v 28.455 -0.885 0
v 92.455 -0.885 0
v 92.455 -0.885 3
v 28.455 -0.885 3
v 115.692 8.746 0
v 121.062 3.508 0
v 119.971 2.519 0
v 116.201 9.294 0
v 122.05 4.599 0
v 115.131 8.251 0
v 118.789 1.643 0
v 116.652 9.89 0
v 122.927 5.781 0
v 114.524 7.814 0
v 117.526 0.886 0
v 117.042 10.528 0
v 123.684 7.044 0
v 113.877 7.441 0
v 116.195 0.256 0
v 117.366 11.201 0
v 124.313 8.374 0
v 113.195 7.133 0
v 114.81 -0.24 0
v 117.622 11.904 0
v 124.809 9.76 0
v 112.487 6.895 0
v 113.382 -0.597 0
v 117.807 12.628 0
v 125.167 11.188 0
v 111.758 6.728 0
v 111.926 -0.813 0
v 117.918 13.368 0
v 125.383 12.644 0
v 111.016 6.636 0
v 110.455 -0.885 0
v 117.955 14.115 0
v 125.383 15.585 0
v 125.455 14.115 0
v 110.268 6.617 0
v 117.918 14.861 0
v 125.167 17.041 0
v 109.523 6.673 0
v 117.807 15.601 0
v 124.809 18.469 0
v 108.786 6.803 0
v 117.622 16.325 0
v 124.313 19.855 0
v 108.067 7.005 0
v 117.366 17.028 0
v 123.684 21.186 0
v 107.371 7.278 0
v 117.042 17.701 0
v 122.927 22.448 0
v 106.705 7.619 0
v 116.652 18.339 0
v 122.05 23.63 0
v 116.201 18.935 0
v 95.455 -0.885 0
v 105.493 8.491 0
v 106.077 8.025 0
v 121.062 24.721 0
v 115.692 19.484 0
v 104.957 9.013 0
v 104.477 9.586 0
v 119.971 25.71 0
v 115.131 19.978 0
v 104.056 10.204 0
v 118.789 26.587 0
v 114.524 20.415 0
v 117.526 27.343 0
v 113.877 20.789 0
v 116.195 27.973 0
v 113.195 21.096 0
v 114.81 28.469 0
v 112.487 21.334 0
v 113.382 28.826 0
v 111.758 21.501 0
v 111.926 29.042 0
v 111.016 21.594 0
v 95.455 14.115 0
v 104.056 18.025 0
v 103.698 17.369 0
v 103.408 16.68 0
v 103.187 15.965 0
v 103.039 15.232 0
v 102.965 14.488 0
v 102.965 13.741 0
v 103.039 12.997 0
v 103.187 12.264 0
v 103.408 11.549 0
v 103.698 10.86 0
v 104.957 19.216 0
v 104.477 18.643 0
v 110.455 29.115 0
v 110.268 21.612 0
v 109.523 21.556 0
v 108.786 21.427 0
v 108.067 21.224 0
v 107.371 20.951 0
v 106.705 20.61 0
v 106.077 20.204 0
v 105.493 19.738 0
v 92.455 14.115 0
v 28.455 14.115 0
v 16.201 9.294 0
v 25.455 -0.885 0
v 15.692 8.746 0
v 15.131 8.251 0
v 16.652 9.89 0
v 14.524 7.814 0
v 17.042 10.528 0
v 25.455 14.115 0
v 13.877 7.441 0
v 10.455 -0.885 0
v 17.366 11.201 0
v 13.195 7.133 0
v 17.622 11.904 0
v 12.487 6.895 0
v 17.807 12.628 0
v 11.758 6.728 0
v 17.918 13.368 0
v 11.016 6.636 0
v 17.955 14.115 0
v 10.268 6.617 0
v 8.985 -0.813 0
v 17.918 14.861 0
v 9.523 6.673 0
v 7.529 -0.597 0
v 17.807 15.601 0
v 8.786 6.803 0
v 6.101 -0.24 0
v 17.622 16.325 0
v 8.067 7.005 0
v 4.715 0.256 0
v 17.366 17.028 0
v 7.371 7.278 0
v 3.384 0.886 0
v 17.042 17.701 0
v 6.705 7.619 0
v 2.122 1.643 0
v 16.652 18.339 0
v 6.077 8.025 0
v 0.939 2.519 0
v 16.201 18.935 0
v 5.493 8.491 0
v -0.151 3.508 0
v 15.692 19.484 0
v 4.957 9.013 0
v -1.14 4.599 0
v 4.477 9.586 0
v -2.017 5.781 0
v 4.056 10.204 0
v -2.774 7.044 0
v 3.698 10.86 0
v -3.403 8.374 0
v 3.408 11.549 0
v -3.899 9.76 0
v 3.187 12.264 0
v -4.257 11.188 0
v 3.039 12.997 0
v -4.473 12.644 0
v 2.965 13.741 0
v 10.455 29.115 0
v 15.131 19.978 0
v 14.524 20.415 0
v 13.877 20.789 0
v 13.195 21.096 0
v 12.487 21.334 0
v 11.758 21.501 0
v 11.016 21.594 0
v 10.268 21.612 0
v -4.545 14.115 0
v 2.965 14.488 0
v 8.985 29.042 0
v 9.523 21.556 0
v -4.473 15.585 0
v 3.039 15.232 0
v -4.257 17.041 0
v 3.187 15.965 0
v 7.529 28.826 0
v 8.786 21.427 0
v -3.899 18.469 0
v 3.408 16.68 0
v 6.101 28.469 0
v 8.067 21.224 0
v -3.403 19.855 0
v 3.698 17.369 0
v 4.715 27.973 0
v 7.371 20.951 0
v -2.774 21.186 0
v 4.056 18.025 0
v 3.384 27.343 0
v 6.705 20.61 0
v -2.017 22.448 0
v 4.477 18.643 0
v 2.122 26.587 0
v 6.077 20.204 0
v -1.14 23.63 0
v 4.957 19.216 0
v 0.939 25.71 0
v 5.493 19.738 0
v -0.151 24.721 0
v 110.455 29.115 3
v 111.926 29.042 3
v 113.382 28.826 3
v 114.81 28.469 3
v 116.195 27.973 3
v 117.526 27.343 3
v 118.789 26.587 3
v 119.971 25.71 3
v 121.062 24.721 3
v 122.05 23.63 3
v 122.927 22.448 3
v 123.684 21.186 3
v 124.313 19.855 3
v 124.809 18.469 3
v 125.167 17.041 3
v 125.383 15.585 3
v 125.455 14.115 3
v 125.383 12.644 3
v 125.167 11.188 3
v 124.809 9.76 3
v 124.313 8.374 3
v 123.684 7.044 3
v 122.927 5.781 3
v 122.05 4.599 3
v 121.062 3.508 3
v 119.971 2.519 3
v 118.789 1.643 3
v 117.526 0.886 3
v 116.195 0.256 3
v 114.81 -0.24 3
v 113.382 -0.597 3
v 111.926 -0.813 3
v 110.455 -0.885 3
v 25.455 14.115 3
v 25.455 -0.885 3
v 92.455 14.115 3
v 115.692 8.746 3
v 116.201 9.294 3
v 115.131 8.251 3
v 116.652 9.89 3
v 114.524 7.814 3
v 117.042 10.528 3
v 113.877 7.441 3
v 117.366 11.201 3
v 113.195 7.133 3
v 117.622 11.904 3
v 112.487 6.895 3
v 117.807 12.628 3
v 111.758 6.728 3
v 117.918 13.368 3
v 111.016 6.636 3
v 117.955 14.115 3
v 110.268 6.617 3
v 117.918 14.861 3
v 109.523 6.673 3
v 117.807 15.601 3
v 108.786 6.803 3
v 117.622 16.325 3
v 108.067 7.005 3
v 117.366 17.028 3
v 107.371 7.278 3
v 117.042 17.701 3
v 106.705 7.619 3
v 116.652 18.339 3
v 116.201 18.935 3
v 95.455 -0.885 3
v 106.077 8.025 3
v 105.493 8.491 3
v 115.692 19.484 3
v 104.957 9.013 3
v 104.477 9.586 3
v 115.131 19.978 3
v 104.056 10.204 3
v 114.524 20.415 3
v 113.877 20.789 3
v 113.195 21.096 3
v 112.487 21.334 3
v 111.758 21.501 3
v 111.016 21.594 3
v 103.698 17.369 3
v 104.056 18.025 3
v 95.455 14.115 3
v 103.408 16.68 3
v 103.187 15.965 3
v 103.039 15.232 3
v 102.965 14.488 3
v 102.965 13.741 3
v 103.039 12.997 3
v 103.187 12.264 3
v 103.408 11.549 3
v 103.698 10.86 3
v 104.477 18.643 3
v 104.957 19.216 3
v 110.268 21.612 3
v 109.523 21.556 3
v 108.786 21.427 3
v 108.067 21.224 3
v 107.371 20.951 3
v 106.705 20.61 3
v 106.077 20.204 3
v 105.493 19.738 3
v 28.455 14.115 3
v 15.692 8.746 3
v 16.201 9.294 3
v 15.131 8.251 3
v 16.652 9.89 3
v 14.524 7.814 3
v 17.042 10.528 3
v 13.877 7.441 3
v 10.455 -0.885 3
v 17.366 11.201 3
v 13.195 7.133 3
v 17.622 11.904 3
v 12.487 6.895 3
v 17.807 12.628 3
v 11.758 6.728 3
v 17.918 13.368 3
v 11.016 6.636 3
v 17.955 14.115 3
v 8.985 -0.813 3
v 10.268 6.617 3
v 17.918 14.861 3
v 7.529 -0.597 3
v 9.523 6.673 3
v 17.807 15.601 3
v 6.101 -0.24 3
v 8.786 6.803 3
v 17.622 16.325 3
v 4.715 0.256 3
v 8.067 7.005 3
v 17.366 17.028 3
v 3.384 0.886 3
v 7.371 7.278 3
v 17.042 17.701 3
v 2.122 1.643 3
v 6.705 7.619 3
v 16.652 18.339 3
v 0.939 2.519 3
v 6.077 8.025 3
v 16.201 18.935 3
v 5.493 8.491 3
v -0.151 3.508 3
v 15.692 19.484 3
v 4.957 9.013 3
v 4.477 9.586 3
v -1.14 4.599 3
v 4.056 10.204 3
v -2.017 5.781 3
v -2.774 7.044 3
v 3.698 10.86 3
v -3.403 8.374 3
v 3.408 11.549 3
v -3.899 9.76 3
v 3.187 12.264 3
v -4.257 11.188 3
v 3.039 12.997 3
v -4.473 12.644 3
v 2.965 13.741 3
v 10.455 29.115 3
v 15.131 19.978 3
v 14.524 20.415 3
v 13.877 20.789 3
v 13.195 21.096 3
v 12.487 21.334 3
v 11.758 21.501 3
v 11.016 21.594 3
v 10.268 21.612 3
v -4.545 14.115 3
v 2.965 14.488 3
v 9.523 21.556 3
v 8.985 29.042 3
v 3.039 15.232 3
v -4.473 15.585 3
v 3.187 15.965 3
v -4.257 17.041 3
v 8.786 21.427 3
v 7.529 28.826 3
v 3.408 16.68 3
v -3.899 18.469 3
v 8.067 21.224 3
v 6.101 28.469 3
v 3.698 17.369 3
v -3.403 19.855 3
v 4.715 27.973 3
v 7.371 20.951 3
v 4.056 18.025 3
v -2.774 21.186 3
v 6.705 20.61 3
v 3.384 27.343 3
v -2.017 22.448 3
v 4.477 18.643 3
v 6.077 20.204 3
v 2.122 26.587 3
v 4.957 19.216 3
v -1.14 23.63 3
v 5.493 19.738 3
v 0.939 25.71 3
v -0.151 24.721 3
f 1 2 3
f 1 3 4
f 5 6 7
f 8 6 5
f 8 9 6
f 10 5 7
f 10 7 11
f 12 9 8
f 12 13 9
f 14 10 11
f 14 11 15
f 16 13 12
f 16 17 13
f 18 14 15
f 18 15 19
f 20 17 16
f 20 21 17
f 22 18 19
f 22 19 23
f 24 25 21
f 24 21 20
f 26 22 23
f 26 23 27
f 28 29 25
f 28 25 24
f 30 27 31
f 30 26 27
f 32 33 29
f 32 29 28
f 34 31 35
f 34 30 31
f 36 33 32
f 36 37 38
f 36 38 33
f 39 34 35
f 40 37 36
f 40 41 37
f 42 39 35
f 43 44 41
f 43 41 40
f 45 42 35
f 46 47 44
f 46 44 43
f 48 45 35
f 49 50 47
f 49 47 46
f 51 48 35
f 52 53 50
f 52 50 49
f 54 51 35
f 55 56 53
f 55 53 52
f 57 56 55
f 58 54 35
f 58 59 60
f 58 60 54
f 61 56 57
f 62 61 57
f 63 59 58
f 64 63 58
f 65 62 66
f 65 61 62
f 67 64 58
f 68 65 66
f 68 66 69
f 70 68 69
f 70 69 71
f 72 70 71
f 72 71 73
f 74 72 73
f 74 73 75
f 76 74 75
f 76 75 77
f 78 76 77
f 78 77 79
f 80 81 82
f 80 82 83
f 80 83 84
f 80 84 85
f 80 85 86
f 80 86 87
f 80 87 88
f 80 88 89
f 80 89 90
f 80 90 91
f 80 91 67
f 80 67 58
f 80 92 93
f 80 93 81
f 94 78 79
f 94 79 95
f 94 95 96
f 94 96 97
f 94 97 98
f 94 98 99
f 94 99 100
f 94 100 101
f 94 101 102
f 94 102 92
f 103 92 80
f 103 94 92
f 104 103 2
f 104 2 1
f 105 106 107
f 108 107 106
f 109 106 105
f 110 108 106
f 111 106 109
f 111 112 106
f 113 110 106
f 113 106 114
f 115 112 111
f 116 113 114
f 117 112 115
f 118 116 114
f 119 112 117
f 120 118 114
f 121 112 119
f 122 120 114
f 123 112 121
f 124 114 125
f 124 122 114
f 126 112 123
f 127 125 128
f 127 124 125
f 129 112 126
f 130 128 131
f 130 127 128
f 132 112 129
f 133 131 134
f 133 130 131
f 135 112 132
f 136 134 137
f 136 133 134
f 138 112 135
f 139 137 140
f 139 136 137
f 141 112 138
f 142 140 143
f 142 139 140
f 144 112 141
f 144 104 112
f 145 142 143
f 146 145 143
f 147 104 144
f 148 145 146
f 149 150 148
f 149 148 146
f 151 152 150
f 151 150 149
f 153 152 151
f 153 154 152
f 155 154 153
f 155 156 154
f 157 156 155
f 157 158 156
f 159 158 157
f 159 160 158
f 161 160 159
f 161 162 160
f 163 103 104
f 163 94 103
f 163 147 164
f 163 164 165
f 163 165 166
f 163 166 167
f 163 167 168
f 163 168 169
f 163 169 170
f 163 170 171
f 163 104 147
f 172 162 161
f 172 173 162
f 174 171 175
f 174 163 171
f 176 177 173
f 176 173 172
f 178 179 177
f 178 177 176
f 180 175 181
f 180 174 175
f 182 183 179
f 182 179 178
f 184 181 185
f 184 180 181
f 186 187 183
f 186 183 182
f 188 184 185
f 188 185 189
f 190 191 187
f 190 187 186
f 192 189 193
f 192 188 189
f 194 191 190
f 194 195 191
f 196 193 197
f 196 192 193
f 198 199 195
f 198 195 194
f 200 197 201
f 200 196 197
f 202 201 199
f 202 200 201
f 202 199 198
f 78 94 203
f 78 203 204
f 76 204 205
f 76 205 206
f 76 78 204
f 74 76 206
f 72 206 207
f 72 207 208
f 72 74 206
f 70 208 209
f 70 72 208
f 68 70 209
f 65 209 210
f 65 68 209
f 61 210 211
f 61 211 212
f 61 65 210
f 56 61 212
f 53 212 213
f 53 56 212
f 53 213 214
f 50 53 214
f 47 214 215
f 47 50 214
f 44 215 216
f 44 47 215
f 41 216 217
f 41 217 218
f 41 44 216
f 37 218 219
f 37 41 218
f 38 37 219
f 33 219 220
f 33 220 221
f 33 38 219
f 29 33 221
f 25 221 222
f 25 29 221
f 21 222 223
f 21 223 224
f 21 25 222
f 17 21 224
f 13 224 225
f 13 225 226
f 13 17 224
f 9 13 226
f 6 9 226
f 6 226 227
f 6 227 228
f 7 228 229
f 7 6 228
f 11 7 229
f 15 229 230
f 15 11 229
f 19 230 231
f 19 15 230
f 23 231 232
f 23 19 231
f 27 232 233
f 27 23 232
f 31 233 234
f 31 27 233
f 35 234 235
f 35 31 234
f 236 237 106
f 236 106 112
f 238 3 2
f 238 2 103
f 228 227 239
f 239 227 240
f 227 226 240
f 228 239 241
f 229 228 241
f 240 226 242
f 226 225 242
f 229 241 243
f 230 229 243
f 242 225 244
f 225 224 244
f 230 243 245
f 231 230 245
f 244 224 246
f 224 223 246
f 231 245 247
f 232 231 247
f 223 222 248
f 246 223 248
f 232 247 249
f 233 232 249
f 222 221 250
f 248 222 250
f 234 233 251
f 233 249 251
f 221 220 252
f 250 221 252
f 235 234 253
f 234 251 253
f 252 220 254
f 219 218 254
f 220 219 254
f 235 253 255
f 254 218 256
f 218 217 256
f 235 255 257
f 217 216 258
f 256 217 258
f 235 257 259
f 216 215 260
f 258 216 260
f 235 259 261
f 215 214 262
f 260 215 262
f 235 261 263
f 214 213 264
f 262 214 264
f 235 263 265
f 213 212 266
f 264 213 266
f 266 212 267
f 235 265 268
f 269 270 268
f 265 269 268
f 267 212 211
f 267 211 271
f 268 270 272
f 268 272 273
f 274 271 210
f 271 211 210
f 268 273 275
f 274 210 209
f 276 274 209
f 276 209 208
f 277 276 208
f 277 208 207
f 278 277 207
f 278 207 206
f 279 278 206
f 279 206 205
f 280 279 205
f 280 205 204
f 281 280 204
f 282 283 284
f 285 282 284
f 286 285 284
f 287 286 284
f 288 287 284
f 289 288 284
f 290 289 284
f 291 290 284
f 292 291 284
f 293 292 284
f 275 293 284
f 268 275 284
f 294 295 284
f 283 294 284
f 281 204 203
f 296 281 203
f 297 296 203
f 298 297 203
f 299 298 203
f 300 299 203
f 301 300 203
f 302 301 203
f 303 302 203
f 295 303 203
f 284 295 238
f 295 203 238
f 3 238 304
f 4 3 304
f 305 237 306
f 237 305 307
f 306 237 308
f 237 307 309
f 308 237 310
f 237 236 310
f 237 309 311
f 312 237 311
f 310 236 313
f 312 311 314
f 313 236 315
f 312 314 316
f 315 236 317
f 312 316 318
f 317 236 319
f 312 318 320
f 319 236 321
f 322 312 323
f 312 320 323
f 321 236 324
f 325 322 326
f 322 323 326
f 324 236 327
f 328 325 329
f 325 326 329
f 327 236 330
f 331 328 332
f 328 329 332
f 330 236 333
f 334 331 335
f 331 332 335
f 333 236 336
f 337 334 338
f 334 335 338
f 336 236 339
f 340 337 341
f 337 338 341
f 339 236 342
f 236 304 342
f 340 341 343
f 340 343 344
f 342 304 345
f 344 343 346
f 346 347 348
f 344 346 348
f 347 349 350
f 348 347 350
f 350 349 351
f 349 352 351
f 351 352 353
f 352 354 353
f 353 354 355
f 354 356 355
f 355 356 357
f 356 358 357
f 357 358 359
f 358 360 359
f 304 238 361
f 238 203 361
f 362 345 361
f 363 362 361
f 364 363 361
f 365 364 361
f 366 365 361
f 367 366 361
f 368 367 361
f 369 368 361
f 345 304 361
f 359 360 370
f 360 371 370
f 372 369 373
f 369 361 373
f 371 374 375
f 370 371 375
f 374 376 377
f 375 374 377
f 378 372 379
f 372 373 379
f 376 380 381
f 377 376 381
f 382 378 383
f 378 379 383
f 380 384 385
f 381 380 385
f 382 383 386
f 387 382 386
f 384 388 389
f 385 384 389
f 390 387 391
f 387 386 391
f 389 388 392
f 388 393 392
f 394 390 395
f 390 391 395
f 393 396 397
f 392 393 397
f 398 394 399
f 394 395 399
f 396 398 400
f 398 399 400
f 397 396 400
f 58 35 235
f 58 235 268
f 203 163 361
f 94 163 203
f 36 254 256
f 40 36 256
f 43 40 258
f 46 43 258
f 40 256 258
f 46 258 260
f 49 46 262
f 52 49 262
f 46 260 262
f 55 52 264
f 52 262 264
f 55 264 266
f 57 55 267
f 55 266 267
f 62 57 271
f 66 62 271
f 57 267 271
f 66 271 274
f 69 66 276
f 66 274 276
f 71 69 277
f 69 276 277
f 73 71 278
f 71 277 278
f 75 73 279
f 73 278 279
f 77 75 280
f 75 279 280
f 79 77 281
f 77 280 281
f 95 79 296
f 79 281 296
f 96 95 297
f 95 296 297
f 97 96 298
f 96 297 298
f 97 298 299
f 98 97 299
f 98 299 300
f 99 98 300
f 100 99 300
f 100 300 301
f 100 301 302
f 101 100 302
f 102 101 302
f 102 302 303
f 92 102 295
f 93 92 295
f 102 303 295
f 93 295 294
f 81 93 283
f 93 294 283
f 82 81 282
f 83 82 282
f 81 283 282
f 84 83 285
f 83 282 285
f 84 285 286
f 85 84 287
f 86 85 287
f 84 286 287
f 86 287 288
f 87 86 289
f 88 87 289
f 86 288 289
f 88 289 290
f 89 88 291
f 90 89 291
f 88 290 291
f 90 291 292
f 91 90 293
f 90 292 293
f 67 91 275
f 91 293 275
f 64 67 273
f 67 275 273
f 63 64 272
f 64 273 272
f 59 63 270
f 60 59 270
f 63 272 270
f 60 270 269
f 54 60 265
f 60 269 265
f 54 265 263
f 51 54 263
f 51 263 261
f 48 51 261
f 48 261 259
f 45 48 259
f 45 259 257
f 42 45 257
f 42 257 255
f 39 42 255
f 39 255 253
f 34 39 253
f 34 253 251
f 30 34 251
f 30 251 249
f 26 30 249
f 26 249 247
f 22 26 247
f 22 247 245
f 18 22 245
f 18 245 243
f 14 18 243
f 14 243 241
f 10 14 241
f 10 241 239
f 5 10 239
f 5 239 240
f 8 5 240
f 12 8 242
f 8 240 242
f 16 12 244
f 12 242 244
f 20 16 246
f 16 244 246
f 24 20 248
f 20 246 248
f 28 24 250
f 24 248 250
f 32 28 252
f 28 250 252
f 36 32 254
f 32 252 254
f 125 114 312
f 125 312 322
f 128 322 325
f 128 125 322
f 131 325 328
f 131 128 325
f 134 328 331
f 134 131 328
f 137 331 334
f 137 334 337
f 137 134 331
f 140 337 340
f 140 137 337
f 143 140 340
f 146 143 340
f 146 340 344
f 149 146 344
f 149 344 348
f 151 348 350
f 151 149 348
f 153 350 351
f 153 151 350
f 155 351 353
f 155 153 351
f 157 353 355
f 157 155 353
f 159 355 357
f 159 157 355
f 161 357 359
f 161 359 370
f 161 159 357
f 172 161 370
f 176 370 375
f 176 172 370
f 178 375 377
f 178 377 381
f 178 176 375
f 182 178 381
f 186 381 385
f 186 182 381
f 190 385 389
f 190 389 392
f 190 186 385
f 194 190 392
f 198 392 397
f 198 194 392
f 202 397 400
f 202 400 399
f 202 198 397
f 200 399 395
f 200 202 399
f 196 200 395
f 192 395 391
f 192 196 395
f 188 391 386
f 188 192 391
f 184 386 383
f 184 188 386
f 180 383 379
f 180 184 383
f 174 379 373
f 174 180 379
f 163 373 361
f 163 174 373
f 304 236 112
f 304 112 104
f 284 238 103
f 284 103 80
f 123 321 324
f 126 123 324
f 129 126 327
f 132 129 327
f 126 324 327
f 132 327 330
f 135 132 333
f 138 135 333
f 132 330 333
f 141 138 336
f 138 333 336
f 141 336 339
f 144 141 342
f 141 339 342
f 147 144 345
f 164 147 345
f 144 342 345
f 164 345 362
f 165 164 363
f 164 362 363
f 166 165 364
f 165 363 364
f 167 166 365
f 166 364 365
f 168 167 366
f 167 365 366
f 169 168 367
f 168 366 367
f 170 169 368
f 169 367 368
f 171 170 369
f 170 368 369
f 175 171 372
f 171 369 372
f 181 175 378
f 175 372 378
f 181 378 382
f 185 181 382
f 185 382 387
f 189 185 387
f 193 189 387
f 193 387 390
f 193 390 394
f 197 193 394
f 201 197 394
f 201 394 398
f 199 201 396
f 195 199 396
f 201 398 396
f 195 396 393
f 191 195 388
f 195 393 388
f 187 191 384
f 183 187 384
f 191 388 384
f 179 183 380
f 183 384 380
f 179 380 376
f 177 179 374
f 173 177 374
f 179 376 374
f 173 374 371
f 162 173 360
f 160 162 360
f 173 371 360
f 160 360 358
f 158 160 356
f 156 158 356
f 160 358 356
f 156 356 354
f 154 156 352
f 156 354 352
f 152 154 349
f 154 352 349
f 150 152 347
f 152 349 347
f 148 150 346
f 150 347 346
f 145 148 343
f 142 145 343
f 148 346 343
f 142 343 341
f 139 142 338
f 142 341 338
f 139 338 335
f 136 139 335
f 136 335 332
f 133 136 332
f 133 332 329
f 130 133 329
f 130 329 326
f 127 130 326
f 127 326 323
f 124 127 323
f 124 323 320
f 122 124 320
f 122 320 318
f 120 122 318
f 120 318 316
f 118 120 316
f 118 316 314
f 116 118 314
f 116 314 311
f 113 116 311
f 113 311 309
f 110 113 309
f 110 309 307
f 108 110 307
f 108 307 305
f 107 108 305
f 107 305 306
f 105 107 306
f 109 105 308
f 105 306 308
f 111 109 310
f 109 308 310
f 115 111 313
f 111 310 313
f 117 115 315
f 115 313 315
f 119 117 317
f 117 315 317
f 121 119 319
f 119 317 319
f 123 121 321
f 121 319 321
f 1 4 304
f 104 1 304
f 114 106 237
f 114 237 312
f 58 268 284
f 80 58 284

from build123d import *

# Parameters (mm, degrees)
BOSS_EXTRUDE1_DEPTH = 3
SKETCH2_W           = 3
SKETCH2_H           = 15
CUT_EXTRUDE1_DEPTH  = 3
SKETCH3_R           = 7.5
CUT_EXTRUDE2_DEPTH  = 3


with BuildPart() as part:
    # Sketch1 → Boss-Extrude1 (new body)
    with BuildSketch(Plane.XY):
        with BuildLine():
            Line((10.455245645, 29.11454936), (110.455245645, 29.11454936))
            ThreePointArc((110.455245645, 29.11454936), (125.455245645, 14.11454936), (110.455245645, -0.88545064))
            Line((110.455245645, -0.88545064), (10.455245645, -0.88545064))
            ThreePointArc((10.455245645, -0.88545064), (-4.544754355, 14.11454936), (10.455245645, 29.11454936))
        make_face()
    extrude(amount=BOSS_EXTRUDE1_DEPTH)

    # Sketch2 → Cut-Extrude1 (cut)
    with BuildSketch(Plane.XY.offset(3)):
        with Locations((26.955245645, 6.61454936)):
            Rectangle(SKETCH2_W, SKETCH2_H)
        with Locations((93.955245645, 6.61454936)):
            Rectangle(SKETCH2_W, SKETCH2_H)
    extrude(amount=-CUT_EXTRUDE1_DEPTH, mode=Mode.SUBTRACT)

    # Sketch3 → Cut-Extrude2 (cut)
    with BuildSketch(Plane.XY.offset(3)):
        with Locations((10.455245645, 14.11454936)):
            Circle(SKETCH3_R)
        with Locations((110.455245645, 14.11454936)):
            Circle(SKETCH3_R)
    extrude(amount=-CUT_EXTRUDE2_DEPTH, mode=Mode.SUBTRACT)


solid = part.part
